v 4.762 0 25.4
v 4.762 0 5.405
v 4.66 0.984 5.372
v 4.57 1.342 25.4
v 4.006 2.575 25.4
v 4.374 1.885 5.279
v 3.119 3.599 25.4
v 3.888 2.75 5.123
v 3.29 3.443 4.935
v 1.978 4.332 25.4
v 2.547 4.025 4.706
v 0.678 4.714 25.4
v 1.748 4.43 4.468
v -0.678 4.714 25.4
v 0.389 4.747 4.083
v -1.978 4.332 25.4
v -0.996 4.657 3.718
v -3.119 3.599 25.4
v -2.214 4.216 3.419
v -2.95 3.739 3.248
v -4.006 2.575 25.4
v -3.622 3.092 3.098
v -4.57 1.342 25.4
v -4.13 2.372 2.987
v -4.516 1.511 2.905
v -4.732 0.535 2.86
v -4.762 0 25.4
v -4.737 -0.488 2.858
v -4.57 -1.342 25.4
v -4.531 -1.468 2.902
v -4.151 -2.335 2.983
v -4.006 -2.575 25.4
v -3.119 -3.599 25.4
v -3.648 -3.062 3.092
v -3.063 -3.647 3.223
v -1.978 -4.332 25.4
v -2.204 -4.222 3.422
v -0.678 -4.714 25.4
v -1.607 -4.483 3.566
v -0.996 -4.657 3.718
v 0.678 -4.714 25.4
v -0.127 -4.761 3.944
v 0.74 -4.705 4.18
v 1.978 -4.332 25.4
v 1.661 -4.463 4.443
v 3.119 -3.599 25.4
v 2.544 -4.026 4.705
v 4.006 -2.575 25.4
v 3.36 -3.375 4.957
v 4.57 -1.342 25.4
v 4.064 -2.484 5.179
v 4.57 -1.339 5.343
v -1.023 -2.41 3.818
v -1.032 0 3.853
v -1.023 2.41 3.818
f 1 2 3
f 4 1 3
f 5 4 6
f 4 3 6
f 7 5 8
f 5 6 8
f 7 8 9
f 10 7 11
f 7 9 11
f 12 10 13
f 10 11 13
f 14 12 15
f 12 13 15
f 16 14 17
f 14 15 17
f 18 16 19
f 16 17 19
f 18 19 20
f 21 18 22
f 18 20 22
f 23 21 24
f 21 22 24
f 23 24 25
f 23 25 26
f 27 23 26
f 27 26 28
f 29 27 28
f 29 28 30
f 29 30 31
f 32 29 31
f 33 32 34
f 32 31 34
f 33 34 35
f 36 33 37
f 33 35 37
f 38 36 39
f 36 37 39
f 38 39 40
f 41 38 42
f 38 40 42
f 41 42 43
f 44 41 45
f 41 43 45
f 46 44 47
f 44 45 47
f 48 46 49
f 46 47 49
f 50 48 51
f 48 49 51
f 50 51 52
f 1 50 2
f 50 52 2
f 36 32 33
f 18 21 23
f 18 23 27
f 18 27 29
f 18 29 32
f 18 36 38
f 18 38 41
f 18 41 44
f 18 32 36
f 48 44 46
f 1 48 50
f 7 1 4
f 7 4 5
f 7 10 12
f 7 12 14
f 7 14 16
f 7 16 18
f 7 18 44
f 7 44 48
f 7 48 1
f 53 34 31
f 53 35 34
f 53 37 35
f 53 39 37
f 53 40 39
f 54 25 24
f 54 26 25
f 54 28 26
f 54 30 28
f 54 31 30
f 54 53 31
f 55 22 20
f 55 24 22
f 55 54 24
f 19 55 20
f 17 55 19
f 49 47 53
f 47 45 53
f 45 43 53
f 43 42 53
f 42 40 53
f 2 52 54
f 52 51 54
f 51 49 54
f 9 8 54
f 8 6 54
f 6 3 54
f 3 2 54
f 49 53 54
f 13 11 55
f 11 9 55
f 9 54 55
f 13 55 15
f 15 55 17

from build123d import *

# Parameters (mm, degrees)
SKETCH1_R               = 4.7625
BOSS_EXTRUDE1_DEPTH     = 25.4
SKETCH2_RX              = 4.7625
SKETCH2_RY              = 1.232625702
SKETCH2_RX_2            = 9.362827468
SKETCH2_RY_2            = 1.051298719
CUT_EXTRUDE1_DEPTH      = 27.277800755
CUT_EXTRUDE1_DEPTH_BACK = 27.277800755


with BuildPart() as part:
    # Sketch1 → Boss-Extrude1 (new body)
    with BuildSketch(Plane.XY):
        Circle(SKETCH1_R)
    extrude(amount=BOSS_EXTRUDE1_DEPTH)

    # Sketch2 → Cut-Extrude1 (cut, two sides)
    with BuildSketch(Plane(origin=(0, 0, 0), x_dir=(0, 1, 0), z_dir=(-0.9659258262890691, 0, -0.2588190451025179))) as cut_extrude1_sk:
        with Locations(Location((0, 0), (0, 0, 180))):
            Ellipse(SKETCH2_RX, SKETCH2_RY)
        with Locations((0, -2.93730779)):
            Ellipse(SKETCH2_RX_2, SKETCH2_RY_2)
    extrude(amount=CUT_EXTRUDE1_DEPTH, mode=Mode.SUBTRACT)
    extrude(cut_extrude1_sk.sketch, amount=-CUT_EXTRUDE1_DEPTH_BACK, mode=Mode.SUBTRACT)


with BuildPart() as cut_extrude1_kept_piece:
    # of the separate pieces the step leaves, the one the design keeps (cut_extrude1_pieces_kept)
    add(part.part.solids().sort_by_distance((-0.996279445, 4.657127174, 3.718165509))[0])


solid = cut_extrude1_kept_piece.part
